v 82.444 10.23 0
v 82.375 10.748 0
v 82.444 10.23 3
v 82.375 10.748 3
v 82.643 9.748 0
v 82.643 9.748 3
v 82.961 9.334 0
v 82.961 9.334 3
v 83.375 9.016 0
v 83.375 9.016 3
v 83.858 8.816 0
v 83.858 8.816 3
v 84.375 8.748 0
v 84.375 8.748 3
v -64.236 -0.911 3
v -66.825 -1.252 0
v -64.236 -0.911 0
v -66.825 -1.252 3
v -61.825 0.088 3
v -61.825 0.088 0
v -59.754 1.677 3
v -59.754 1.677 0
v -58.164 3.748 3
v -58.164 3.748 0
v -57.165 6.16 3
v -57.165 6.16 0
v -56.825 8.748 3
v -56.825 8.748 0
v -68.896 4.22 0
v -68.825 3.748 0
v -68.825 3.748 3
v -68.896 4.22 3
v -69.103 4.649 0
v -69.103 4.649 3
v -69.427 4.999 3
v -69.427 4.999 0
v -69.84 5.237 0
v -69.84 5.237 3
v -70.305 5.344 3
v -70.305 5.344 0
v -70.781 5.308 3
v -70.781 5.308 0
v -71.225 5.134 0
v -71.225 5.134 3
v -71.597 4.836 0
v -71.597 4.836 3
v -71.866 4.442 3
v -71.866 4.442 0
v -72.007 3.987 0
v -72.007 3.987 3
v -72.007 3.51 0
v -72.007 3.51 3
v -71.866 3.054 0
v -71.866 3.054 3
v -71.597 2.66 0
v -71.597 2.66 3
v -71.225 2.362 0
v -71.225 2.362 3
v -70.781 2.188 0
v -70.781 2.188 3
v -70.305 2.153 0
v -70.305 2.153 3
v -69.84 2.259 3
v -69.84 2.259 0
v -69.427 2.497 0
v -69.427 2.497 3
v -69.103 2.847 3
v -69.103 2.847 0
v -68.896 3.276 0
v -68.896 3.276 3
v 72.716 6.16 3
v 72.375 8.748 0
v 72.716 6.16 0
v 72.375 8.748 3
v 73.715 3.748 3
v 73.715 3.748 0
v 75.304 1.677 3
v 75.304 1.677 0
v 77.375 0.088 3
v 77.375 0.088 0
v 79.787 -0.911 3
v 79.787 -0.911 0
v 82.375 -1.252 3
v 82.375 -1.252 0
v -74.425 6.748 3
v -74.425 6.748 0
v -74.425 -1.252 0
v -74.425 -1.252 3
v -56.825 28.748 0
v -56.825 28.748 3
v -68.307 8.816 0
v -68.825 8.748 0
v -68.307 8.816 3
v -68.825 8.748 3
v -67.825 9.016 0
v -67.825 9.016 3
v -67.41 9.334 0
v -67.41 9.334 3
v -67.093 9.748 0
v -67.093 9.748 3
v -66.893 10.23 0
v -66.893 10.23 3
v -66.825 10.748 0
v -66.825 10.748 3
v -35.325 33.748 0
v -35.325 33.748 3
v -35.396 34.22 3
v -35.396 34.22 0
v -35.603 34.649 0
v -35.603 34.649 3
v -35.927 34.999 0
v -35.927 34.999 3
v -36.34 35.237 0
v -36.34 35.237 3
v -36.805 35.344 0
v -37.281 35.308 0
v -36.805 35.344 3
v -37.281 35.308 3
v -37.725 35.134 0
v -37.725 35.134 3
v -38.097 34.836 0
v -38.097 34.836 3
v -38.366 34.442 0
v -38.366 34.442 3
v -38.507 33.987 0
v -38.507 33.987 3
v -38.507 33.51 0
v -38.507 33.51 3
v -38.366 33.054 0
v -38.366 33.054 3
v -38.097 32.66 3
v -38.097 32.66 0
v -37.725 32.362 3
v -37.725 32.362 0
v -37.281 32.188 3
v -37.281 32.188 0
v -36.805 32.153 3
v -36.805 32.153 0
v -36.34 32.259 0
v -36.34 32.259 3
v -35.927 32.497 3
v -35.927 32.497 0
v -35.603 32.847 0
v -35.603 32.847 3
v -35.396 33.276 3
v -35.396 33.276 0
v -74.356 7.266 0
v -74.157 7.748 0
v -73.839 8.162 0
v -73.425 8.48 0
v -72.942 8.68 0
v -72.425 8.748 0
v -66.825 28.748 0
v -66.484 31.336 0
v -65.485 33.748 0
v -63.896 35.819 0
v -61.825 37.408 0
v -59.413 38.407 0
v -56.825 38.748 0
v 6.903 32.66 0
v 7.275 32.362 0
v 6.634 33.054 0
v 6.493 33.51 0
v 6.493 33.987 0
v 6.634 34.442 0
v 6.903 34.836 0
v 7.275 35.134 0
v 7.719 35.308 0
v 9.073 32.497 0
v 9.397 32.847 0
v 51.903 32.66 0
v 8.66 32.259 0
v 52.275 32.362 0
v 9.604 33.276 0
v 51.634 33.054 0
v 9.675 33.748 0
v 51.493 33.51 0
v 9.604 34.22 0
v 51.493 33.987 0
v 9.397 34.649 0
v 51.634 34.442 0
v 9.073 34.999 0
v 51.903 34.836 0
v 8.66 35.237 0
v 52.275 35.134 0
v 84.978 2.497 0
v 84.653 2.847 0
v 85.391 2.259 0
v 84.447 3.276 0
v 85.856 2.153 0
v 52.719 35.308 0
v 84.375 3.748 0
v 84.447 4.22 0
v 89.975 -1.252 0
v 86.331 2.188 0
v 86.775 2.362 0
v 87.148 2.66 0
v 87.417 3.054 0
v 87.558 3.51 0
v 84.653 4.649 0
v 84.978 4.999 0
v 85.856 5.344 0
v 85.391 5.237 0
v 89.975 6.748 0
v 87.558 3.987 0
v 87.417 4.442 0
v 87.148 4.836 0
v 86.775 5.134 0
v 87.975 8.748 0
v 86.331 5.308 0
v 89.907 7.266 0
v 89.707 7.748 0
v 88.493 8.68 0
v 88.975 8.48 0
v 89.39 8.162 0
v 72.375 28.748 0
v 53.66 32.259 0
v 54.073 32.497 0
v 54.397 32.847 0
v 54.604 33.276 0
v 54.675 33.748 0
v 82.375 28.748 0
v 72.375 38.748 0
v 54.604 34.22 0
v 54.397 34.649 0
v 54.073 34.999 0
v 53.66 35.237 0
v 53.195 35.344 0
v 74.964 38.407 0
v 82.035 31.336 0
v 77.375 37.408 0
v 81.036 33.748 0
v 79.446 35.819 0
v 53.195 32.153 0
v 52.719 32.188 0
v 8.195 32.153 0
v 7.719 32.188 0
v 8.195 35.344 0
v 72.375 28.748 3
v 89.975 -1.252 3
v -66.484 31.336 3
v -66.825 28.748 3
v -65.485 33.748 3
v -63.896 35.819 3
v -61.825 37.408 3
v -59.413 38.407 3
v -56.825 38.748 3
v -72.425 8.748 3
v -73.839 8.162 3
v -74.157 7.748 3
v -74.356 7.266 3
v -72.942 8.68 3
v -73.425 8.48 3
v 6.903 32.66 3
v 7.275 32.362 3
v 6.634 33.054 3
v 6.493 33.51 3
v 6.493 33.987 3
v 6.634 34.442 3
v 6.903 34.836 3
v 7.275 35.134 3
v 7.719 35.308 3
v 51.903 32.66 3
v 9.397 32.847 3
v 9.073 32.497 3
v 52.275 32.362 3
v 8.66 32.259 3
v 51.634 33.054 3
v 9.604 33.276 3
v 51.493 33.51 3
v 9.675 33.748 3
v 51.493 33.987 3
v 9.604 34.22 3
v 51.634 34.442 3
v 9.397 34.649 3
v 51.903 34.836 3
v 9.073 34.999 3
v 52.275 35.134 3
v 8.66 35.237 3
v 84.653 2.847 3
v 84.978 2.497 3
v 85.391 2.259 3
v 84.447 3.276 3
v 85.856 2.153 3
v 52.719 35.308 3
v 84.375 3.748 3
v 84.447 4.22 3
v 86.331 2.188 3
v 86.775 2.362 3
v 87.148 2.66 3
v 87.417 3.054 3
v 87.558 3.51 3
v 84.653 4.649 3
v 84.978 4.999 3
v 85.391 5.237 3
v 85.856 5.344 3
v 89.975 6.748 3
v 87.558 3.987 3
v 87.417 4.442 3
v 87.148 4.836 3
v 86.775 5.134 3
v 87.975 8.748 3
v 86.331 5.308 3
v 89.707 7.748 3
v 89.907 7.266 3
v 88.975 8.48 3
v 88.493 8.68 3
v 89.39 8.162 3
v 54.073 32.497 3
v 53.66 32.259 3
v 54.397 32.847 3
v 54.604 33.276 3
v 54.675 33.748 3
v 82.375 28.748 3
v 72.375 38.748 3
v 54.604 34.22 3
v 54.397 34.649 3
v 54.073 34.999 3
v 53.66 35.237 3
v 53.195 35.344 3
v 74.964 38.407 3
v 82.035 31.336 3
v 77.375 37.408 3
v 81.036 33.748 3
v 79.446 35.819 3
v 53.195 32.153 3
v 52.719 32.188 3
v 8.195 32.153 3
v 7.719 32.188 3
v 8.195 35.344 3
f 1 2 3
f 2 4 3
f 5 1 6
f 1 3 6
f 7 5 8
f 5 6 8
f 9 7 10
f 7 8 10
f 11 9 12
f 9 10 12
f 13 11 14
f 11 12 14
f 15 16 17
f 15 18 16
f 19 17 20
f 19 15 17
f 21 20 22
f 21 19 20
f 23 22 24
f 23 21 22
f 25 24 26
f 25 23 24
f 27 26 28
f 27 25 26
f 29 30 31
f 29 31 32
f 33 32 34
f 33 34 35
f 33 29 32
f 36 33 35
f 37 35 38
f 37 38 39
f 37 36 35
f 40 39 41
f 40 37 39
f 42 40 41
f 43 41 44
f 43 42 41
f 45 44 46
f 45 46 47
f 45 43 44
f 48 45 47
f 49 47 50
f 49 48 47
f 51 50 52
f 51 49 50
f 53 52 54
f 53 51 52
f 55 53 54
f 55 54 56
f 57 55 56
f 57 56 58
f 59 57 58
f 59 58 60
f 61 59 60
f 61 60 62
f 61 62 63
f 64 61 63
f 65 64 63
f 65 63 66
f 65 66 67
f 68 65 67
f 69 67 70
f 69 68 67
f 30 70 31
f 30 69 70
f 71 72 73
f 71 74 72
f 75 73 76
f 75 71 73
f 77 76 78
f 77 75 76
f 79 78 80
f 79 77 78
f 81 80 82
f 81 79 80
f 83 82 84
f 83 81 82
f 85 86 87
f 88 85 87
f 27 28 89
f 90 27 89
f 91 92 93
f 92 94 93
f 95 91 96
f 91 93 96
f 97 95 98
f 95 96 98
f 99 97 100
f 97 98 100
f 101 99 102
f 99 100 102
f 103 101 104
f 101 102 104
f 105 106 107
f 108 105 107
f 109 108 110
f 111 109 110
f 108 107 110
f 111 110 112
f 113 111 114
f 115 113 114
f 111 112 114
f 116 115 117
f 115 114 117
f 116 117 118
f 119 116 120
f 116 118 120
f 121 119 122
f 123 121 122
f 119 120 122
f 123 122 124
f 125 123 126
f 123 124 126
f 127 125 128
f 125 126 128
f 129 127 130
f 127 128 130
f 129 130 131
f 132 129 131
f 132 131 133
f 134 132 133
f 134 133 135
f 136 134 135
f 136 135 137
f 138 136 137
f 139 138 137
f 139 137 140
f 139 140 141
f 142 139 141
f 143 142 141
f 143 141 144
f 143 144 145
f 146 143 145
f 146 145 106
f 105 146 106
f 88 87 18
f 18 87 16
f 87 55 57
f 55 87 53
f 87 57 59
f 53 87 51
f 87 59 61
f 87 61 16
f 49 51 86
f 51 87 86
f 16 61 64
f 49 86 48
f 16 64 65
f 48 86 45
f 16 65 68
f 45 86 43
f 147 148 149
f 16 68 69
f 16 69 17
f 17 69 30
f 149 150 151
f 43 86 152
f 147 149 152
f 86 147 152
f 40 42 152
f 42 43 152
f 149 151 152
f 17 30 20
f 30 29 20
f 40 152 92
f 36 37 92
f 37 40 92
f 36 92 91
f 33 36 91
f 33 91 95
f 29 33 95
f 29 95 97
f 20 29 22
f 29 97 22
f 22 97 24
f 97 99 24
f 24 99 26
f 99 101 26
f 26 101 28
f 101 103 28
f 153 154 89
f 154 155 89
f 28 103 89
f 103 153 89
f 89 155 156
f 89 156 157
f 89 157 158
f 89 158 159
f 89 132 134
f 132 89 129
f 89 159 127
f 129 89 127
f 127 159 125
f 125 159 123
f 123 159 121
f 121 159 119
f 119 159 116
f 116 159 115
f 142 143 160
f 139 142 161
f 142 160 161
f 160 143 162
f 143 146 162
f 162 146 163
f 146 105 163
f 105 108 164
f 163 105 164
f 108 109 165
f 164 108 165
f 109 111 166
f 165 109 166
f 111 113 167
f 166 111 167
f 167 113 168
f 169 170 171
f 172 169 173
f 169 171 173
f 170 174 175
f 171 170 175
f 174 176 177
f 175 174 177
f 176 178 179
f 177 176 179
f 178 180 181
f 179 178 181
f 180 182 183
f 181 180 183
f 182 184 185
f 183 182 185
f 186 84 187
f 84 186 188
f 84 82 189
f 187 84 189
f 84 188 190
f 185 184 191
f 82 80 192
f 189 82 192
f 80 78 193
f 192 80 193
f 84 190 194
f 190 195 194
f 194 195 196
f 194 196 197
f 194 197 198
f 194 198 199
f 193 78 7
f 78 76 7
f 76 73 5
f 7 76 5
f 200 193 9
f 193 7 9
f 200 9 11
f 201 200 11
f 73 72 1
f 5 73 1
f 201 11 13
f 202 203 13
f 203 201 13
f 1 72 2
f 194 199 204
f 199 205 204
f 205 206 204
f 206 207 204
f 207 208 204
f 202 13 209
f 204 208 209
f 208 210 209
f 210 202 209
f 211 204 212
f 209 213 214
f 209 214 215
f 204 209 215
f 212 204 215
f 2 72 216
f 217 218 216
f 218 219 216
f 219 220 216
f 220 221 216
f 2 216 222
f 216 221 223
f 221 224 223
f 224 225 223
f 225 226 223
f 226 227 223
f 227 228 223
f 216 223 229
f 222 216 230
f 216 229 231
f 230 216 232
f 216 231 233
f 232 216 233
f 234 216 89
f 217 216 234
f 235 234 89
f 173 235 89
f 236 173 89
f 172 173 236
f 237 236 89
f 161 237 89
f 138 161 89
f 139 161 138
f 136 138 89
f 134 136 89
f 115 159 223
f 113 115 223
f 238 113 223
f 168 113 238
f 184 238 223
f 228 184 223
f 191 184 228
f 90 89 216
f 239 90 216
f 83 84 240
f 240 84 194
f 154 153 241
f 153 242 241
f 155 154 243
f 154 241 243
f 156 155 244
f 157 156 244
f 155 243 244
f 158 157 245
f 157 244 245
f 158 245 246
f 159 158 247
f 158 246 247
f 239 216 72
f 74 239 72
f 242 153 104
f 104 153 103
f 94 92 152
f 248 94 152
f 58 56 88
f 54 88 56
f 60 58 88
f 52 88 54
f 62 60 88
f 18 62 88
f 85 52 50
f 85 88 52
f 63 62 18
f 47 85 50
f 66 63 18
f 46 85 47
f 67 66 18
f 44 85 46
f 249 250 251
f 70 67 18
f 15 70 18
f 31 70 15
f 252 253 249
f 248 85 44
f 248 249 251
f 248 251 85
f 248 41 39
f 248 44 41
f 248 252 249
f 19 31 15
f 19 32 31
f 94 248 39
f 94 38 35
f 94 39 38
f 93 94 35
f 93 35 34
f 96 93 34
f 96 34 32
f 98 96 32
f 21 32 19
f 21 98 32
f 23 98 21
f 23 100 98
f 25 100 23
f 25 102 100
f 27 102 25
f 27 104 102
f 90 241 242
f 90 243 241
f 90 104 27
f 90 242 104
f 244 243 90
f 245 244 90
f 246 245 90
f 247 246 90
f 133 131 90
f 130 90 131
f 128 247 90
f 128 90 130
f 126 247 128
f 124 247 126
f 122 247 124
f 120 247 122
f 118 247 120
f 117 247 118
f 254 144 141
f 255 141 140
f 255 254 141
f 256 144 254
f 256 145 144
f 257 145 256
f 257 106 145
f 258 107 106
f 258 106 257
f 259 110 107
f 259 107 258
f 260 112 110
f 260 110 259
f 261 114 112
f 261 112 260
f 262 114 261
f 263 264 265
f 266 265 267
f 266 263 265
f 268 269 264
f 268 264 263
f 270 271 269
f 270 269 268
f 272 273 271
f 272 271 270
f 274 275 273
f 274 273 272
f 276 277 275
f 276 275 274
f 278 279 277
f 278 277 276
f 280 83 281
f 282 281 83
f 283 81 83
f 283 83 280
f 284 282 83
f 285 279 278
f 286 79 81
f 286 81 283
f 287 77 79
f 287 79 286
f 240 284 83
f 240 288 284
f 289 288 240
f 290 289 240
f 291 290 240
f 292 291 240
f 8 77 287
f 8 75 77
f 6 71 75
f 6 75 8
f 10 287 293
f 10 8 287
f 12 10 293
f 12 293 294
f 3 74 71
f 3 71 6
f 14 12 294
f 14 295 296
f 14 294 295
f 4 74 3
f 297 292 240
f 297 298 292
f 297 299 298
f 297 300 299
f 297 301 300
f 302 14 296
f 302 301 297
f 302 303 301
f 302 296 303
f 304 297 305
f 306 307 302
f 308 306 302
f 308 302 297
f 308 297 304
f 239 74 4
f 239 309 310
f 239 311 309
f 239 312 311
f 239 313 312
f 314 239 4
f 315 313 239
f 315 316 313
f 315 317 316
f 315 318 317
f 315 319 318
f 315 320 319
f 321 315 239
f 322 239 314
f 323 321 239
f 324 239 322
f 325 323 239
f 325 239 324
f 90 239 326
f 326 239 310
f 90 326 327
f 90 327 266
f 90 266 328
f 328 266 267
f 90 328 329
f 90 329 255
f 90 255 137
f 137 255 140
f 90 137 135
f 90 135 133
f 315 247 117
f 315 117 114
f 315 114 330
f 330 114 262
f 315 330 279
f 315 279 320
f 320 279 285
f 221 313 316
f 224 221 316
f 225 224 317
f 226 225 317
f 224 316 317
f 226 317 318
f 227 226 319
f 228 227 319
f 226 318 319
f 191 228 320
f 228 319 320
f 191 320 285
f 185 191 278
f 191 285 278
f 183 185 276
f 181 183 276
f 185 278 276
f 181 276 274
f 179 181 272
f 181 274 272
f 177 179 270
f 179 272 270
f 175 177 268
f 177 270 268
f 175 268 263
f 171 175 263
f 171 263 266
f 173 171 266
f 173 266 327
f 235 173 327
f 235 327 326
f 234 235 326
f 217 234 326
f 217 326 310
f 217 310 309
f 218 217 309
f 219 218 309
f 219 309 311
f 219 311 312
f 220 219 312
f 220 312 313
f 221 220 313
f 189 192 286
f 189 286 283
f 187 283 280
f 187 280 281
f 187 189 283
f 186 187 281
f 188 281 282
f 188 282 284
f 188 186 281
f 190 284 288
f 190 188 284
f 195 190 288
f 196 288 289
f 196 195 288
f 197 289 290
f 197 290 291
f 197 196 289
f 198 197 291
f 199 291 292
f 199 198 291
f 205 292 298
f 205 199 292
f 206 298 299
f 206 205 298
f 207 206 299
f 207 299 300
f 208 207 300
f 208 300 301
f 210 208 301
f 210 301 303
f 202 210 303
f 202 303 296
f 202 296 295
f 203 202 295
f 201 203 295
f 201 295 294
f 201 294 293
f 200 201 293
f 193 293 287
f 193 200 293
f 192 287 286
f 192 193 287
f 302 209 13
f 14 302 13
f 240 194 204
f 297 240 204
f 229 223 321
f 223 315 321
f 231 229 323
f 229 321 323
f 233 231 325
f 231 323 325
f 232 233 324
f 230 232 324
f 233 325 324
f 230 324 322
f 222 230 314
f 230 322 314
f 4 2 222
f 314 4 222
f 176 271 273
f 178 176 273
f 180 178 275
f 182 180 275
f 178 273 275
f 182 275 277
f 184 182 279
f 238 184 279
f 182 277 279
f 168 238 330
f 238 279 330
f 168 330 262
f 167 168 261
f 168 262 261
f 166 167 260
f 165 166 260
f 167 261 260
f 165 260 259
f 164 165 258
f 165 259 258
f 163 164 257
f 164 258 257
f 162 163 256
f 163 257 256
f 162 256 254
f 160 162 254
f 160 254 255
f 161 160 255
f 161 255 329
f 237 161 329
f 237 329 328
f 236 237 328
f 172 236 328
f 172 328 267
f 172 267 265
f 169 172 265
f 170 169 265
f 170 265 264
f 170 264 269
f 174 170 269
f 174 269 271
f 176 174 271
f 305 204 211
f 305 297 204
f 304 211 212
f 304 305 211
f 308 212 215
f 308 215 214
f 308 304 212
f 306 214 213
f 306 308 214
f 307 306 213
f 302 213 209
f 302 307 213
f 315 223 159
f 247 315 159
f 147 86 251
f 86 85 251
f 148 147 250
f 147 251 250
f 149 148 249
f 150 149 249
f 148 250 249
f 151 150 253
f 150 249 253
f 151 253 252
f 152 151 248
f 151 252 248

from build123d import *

# Parameters (mm, degrees)
SKETCH2_R           = 1.6
BOSS_EXTRUDE1_DEPTH = 3
CUT_EXTRUDE1_REACH  = 100.01
SKETCH3_R           = 1.6
FILLET1_R           = 10
FILLET2_R           = 2


with BuildPart() as part:
    # Sketch2 → Boss-Extrude1 (new body)
    with BuildSketch(Plane.XY):
        Polygon((-74.424572317, -1.251944012), (-56.824572317, -1.251944012), (-56.824572317, 28.748055988), (72.375427683, 28.748055988), (72.375427683, -1.251944012), (89.975427683, -1.251944012), (89.975427683, 8.748055988), (82.375427683, 8.748055988), (82.375427683, 38.748055988), (-66.824572317, 38.748055988), (-66.824572317, 8.748055988), (-74.424572317, 8.748055988), align=None)
        with Locations((-70.424572317, 3.748055988)):
            Circle(SKETCH2_R, mode=Mode.SUBTRACT)
        with Locations(Location((85.975427683, 3.748055988, 0), (0, 0, 180))):
            Circle(SKETCH2_R, mode=Mode.SUBTRACT)
    extrude(amount=BOSS_EXTRUDE1_DEPTH)

    # Sketch3 → Cut-Extrude1 (cut, up to next)
    with BuildSketch(Plane.XY.offset(3), mode=Mode.PRIVATE) as cut_extrude1_sk1:
        with Locations((-36.924572317, 33.748055988)):
            Circle(SKETCH3_R)
    cut_extrude1_tool1 = extrude(cut_extrude1_sk1.sketch, amount=-CUT_EXTRUDE1_REACH, mode=Mode.PRIVATE) & part.part
    # Sketch3 → Cut-Extrude1 (cut, up to next)
    with BuildSketch(Plane.XY.offset(3), mode=Mode.PRIVATE) as cut_extrude1_sk2:
        with Locations((8.075427683, 33.748055988)):
            Circle(SKETCH3_R)
    cut_extrude1_tool2 = extrude(cut_extrude1_sk2.sketch, amount=-CUT_EXTRUDE1_REACH, mode=Mode.PRIVATE) & part.part
    # Sketch3 → Cut-Extrude1 (cut, up to next)
    with BuildSketch(Plane.XY.offset(3), mode=Mode.PRIVATE) as cut_extrude1_sk3:
        with Locations((53.075427683, 33.748055988)):
            Circle(SKETCH3_R)
    cut_extrude1_tool3 = extrude(cut_extrude1_sk3.sketch, amount=-CUT_EXTRUDE1_REACH, mode=Mode.PRIVATE) & part.part
    add(cut_extrude1_tool1.solids().sort_by_distance((-36.924572, 33.748056, 3))[0], mode=Mode.SUBTRACT)
    add(cut_extrude1_tool2.solids().sort_by_distance((8.075428, 33.748056, 3))[0], mode=Mode.SUBTRACT)
    add(cut_extrude1_tool3.solids().sort_by_distance((53.075428, 33.748056, 3))[0], mode=Mode.SUBTRACT)

    # Fillet1
    fillet1_edges = [part.edges().sort_by_distance(p)[0] for p in [
        (-66.824572317, 38.748055988, 1.5),
        (82.375427683, 38.748055988, 1.5),
        (72.375427683, -1.251944012, 1.5),
        (-56.824572317, -1.251944012, 1.5),
    ]]
    fillet(fillet1_edges, radius=FILLET1_R)

    # Fillet2
    fillet2_edges = [part.edges().sort_by_distance(p)[0] for p in [
        (-74.424572317, 8.748055988, 1.5),
        (-66.824572317, 8.748055988, 1.5),
        (82.375427683, 8.748055988, 1.5),
        (89.975427683, 8.748055988, 1.5),
    ]]
    fillet(fillet2_edges, radius=FILLET2_R)


solid = part.part
